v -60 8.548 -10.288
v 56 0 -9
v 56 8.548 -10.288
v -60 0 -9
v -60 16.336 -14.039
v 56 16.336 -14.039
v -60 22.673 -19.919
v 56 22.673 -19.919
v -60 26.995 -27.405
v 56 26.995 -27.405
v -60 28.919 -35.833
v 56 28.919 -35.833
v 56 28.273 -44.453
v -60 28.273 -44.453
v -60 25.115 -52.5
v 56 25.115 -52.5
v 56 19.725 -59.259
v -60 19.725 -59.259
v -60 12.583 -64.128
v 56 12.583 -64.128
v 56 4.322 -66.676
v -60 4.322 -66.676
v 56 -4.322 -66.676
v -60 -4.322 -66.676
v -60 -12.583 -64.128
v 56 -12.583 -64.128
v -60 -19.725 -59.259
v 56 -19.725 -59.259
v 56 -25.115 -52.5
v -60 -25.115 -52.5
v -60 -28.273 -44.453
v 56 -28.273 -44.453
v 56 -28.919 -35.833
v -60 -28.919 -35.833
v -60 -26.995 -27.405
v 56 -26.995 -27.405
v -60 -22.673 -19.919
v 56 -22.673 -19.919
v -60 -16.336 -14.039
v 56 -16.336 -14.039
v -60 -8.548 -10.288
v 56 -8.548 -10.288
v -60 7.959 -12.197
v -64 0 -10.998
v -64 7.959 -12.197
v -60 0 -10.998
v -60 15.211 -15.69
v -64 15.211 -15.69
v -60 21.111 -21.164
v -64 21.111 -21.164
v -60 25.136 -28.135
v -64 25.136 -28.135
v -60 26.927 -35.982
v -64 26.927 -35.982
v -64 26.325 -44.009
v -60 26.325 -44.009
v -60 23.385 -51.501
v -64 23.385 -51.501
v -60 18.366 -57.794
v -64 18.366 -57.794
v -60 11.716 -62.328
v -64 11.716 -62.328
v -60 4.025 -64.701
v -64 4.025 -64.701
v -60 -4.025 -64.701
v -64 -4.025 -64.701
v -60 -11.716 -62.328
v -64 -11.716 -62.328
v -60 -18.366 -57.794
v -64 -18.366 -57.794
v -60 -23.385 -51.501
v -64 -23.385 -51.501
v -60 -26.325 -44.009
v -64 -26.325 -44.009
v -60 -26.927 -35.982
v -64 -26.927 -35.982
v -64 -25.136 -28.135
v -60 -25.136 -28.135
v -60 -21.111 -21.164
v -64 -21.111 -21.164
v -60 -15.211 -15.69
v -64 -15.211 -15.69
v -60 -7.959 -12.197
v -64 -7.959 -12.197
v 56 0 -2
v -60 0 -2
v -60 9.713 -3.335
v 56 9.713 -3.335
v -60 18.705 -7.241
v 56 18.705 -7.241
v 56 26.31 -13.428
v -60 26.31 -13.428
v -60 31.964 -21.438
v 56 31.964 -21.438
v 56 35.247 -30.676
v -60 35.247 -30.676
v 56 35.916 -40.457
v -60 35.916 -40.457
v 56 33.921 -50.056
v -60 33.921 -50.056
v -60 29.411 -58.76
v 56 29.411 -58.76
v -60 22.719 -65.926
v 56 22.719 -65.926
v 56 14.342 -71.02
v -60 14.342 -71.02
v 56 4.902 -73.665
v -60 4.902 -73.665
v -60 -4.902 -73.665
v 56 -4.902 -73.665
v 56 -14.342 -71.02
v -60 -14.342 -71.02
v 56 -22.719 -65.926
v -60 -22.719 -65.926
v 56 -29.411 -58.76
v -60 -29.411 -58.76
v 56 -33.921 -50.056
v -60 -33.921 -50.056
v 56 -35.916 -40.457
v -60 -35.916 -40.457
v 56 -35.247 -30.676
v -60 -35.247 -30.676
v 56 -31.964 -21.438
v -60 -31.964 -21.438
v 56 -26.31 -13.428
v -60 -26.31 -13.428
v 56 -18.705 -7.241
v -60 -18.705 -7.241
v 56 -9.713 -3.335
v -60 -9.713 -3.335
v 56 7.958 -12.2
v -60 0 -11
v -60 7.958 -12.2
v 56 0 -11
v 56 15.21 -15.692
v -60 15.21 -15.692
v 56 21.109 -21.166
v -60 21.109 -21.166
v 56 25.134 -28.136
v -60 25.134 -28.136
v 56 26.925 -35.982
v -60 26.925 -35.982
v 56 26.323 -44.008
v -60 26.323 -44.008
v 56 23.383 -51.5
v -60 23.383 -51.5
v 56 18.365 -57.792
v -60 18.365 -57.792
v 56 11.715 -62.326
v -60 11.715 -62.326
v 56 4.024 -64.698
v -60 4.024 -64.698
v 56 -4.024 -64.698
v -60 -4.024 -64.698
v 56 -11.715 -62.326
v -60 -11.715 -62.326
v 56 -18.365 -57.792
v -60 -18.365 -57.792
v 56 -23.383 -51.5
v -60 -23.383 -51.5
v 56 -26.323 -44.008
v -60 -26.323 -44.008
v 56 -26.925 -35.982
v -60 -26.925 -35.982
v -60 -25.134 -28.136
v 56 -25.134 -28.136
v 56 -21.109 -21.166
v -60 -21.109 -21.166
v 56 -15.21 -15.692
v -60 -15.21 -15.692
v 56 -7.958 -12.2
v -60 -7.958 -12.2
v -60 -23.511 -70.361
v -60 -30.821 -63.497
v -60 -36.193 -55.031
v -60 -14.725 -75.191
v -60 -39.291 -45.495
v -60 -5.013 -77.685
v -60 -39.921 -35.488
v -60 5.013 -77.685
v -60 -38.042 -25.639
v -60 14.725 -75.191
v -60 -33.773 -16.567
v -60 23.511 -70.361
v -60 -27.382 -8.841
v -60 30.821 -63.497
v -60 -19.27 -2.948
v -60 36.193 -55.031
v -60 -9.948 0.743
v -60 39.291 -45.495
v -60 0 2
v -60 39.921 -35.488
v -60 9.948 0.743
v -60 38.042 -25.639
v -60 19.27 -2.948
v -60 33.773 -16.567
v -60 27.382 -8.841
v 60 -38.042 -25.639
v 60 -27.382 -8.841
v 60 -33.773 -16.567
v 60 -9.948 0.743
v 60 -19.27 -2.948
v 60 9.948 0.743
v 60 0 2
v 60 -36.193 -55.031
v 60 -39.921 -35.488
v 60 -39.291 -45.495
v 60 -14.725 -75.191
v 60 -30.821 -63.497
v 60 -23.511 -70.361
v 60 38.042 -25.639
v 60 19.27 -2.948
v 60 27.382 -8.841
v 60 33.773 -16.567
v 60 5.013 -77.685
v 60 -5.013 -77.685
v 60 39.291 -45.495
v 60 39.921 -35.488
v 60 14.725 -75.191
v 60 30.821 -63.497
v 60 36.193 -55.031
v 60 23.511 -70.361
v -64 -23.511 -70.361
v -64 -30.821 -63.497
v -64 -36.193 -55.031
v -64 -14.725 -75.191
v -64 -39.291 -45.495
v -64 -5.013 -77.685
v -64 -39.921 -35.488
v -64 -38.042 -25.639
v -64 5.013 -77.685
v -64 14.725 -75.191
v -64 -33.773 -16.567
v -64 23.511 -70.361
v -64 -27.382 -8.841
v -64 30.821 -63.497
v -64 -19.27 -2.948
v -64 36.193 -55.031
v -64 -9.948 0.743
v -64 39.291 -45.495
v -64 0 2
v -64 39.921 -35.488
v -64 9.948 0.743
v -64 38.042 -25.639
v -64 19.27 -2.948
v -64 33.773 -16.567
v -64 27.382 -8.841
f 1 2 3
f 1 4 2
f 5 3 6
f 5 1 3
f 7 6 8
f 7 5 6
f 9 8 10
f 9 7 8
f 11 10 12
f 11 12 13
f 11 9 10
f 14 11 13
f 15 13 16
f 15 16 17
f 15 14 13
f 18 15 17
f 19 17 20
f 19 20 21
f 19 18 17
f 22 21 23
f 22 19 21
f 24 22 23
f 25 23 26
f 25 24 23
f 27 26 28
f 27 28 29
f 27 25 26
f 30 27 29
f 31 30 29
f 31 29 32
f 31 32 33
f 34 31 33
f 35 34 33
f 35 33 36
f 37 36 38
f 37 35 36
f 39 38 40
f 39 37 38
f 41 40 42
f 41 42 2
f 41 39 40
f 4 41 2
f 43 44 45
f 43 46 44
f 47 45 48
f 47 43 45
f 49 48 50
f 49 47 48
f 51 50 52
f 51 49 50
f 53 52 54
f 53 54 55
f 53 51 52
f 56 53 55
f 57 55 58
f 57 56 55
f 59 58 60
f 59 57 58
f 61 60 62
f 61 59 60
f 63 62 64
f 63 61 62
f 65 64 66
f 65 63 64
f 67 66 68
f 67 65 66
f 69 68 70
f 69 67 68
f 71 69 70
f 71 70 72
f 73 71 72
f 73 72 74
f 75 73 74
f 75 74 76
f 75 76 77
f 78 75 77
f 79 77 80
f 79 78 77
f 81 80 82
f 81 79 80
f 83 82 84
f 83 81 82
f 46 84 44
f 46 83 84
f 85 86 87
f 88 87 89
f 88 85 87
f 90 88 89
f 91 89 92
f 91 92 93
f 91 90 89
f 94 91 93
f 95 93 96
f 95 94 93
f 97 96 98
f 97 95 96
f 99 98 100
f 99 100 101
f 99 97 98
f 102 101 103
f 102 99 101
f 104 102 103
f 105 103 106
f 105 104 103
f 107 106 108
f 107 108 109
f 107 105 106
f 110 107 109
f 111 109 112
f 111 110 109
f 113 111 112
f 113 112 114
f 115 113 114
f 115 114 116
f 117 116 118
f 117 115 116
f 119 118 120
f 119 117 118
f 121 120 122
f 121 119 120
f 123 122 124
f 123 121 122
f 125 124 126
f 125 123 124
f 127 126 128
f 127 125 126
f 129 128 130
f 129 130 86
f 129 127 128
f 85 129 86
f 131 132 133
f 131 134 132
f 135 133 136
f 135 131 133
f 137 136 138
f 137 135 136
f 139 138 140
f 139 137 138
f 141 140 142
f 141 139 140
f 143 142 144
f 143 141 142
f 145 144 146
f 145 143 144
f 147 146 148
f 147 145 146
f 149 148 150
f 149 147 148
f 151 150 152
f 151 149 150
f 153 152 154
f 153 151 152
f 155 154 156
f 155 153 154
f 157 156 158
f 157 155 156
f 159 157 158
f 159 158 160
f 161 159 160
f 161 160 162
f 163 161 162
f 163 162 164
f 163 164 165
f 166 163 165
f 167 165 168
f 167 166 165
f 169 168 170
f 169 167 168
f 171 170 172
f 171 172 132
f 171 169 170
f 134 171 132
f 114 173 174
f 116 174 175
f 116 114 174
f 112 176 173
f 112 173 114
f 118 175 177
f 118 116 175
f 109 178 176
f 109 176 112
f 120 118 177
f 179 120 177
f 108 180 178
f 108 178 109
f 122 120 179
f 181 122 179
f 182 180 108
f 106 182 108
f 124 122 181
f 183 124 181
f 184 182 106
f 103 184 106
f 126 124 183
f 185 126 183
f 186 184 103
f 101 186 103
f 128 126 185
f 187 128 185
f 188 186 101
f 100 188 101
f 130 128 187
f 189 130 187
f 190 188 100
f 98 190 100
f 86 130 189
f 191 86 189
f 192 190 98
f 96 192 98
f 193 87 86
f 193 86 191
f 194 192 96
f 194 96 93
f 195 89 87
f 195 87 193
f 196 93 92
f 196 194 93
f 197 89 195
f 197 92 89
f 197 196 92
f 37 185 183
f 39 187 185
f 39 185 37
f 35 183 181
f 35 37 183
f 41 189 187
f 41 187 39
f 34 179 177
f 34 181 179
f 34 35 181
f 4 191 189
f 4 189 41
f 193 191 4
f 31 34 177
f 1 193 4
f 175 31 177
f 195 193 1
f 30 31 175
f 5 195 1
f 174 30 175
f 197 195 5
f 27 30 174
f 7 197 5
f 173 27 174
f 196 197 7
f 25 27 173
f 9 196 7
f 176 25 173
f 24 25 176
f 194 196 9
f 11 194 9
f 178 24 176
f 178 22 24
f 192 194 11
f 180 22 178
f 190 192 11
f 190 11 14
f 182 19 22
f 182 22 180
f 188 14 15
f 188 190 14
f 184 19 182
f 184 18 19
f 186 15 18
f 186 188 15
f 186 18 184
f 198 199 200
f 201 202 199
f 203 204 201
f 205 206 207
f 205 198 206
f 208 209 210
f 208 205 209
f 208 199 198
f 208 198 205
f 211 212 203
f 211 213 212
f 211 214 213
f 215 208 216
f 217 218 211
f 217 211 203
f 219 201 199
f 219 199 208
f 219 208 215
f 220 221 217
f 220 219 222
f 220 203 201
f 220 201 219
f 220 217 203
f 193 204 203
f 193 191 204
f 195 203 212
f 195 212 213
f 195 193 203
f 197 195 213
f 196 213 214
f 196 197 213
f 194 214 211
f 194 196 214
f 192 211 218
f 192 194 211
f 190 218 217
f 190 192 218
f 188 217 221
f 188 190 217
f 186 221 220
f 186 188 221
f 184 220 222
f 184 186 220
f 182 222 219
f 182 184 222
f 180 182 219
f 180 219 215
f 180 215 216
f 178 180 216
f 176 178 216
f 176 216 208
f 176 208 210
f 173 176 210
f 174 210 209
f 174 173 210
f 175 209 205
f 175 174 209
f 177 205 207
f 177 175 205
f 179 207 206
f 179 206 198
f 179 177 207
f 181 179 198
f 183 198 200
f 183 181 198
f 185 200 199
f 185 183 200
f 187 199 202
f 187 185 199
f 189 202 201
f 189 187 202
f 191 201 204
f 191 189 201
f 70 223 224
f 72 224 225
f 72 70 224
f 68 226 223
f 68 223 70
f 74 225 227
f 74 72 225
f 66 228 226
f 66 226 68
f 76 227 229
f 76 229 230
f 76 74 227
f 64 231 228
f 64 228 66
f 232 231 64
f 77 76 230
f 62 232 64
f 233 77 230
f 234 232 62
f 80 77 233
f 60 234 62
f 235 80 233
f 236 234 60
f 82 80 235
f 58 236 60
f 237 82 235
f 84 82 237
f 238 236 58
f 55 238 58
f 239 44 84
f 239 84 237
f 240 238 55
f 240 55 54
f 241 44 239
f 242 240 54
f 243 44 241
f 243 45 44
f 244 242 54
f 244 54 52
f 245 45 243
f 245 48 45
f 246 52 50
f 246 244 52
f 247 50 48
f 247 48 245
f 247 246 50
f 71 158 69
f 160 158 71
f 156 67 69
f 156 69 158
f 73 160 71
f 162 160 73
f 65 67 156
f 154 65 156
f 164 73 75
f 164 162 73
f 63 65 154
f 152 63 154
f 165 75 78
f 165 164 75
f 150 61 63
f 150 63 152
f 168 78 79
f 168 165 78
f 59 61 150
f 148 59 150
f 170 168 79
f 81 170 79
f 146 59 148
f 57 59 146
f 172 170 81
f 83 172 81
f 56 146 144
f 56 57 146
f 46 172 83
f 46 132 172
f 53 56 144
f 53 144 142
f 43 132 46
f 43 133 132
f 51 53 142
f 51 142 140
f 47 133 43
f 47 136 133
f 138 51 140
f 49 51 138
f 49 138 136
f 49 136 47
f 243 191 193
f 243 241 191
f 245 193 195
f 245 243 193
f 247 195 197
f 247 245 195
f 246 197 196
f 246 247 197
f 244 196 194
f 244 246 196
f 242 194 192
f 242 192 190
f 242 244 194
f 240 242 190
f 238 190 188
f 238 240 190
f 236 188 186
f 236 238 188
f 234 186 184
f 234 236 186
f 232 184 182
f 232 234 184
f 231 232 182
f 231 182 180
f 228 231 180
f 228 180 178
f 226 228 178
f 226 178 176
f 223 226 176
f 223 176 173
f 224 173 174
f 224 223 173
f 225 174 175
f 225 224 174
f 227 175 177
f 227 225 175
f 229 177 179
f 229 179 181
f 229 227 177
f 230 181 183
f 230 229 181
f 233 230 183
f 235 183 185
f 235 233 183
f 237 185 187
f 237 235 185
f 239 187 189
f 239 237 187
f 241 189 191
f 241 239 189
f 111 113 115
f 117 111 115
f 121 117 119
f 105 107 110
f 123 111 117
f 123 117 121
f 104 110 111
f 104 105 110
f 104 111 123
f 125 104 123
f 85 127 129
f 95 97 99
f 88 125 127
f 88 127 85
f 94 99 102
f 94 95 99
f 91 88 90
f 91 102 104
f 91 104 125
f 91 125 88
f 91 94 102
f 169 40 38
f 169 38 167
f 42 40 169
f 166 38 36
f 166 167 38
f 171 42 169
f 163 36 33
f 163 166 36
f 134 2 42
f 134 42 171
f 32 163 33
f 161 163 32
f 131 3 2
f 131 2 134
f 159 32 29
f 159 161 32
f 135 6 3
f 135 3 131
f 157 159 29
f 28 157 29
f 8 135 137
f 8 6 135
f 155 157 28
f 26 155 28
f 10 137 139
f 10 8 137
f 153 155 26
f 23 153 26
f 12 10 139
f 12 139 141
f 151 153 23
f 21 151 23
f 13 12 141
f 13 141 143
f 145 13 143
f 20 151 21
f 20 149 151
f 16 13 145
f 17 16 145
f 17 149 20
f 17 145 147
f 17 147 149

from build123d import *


# Not quite as in the source:
# - a feature names something its author has since deleted; it is built from what else it names


with BuildPart() as f1:
    # F0 (on Front) → F1 (revolve)
    with BuildSketch(Plane.XZ):
        Polygon((56, -2), (60, -2), (60, 2), (-60, 2), (-60, -2), align=None)
        Polygon((60, -38), (60, -2), (56, -2), (56, -9), (56, -11), (56, -38), align=None)
    revolve(axis=Axis((58, 0, -38), (-1, 0, 0)))


with BuildPart() as f2:
    # F0 (on Front) → F2 (revolve)
    with BuildSketch(Plane.XZ):
        Polygon((56, -11), (56, -9), (-60, -9), (-60, -10.997527279), (-60, -11), align=None)
        Polygon((-60, -9), (-60, -2), (-60, 2), (-64, 2), (-64, -10.997527279), (-60, -10.997527279), align=None)
    revolve(axis=Axis((58, 0, -38), (-1, 0, 0)))


solid = Compound([f1.part, f2.part])
